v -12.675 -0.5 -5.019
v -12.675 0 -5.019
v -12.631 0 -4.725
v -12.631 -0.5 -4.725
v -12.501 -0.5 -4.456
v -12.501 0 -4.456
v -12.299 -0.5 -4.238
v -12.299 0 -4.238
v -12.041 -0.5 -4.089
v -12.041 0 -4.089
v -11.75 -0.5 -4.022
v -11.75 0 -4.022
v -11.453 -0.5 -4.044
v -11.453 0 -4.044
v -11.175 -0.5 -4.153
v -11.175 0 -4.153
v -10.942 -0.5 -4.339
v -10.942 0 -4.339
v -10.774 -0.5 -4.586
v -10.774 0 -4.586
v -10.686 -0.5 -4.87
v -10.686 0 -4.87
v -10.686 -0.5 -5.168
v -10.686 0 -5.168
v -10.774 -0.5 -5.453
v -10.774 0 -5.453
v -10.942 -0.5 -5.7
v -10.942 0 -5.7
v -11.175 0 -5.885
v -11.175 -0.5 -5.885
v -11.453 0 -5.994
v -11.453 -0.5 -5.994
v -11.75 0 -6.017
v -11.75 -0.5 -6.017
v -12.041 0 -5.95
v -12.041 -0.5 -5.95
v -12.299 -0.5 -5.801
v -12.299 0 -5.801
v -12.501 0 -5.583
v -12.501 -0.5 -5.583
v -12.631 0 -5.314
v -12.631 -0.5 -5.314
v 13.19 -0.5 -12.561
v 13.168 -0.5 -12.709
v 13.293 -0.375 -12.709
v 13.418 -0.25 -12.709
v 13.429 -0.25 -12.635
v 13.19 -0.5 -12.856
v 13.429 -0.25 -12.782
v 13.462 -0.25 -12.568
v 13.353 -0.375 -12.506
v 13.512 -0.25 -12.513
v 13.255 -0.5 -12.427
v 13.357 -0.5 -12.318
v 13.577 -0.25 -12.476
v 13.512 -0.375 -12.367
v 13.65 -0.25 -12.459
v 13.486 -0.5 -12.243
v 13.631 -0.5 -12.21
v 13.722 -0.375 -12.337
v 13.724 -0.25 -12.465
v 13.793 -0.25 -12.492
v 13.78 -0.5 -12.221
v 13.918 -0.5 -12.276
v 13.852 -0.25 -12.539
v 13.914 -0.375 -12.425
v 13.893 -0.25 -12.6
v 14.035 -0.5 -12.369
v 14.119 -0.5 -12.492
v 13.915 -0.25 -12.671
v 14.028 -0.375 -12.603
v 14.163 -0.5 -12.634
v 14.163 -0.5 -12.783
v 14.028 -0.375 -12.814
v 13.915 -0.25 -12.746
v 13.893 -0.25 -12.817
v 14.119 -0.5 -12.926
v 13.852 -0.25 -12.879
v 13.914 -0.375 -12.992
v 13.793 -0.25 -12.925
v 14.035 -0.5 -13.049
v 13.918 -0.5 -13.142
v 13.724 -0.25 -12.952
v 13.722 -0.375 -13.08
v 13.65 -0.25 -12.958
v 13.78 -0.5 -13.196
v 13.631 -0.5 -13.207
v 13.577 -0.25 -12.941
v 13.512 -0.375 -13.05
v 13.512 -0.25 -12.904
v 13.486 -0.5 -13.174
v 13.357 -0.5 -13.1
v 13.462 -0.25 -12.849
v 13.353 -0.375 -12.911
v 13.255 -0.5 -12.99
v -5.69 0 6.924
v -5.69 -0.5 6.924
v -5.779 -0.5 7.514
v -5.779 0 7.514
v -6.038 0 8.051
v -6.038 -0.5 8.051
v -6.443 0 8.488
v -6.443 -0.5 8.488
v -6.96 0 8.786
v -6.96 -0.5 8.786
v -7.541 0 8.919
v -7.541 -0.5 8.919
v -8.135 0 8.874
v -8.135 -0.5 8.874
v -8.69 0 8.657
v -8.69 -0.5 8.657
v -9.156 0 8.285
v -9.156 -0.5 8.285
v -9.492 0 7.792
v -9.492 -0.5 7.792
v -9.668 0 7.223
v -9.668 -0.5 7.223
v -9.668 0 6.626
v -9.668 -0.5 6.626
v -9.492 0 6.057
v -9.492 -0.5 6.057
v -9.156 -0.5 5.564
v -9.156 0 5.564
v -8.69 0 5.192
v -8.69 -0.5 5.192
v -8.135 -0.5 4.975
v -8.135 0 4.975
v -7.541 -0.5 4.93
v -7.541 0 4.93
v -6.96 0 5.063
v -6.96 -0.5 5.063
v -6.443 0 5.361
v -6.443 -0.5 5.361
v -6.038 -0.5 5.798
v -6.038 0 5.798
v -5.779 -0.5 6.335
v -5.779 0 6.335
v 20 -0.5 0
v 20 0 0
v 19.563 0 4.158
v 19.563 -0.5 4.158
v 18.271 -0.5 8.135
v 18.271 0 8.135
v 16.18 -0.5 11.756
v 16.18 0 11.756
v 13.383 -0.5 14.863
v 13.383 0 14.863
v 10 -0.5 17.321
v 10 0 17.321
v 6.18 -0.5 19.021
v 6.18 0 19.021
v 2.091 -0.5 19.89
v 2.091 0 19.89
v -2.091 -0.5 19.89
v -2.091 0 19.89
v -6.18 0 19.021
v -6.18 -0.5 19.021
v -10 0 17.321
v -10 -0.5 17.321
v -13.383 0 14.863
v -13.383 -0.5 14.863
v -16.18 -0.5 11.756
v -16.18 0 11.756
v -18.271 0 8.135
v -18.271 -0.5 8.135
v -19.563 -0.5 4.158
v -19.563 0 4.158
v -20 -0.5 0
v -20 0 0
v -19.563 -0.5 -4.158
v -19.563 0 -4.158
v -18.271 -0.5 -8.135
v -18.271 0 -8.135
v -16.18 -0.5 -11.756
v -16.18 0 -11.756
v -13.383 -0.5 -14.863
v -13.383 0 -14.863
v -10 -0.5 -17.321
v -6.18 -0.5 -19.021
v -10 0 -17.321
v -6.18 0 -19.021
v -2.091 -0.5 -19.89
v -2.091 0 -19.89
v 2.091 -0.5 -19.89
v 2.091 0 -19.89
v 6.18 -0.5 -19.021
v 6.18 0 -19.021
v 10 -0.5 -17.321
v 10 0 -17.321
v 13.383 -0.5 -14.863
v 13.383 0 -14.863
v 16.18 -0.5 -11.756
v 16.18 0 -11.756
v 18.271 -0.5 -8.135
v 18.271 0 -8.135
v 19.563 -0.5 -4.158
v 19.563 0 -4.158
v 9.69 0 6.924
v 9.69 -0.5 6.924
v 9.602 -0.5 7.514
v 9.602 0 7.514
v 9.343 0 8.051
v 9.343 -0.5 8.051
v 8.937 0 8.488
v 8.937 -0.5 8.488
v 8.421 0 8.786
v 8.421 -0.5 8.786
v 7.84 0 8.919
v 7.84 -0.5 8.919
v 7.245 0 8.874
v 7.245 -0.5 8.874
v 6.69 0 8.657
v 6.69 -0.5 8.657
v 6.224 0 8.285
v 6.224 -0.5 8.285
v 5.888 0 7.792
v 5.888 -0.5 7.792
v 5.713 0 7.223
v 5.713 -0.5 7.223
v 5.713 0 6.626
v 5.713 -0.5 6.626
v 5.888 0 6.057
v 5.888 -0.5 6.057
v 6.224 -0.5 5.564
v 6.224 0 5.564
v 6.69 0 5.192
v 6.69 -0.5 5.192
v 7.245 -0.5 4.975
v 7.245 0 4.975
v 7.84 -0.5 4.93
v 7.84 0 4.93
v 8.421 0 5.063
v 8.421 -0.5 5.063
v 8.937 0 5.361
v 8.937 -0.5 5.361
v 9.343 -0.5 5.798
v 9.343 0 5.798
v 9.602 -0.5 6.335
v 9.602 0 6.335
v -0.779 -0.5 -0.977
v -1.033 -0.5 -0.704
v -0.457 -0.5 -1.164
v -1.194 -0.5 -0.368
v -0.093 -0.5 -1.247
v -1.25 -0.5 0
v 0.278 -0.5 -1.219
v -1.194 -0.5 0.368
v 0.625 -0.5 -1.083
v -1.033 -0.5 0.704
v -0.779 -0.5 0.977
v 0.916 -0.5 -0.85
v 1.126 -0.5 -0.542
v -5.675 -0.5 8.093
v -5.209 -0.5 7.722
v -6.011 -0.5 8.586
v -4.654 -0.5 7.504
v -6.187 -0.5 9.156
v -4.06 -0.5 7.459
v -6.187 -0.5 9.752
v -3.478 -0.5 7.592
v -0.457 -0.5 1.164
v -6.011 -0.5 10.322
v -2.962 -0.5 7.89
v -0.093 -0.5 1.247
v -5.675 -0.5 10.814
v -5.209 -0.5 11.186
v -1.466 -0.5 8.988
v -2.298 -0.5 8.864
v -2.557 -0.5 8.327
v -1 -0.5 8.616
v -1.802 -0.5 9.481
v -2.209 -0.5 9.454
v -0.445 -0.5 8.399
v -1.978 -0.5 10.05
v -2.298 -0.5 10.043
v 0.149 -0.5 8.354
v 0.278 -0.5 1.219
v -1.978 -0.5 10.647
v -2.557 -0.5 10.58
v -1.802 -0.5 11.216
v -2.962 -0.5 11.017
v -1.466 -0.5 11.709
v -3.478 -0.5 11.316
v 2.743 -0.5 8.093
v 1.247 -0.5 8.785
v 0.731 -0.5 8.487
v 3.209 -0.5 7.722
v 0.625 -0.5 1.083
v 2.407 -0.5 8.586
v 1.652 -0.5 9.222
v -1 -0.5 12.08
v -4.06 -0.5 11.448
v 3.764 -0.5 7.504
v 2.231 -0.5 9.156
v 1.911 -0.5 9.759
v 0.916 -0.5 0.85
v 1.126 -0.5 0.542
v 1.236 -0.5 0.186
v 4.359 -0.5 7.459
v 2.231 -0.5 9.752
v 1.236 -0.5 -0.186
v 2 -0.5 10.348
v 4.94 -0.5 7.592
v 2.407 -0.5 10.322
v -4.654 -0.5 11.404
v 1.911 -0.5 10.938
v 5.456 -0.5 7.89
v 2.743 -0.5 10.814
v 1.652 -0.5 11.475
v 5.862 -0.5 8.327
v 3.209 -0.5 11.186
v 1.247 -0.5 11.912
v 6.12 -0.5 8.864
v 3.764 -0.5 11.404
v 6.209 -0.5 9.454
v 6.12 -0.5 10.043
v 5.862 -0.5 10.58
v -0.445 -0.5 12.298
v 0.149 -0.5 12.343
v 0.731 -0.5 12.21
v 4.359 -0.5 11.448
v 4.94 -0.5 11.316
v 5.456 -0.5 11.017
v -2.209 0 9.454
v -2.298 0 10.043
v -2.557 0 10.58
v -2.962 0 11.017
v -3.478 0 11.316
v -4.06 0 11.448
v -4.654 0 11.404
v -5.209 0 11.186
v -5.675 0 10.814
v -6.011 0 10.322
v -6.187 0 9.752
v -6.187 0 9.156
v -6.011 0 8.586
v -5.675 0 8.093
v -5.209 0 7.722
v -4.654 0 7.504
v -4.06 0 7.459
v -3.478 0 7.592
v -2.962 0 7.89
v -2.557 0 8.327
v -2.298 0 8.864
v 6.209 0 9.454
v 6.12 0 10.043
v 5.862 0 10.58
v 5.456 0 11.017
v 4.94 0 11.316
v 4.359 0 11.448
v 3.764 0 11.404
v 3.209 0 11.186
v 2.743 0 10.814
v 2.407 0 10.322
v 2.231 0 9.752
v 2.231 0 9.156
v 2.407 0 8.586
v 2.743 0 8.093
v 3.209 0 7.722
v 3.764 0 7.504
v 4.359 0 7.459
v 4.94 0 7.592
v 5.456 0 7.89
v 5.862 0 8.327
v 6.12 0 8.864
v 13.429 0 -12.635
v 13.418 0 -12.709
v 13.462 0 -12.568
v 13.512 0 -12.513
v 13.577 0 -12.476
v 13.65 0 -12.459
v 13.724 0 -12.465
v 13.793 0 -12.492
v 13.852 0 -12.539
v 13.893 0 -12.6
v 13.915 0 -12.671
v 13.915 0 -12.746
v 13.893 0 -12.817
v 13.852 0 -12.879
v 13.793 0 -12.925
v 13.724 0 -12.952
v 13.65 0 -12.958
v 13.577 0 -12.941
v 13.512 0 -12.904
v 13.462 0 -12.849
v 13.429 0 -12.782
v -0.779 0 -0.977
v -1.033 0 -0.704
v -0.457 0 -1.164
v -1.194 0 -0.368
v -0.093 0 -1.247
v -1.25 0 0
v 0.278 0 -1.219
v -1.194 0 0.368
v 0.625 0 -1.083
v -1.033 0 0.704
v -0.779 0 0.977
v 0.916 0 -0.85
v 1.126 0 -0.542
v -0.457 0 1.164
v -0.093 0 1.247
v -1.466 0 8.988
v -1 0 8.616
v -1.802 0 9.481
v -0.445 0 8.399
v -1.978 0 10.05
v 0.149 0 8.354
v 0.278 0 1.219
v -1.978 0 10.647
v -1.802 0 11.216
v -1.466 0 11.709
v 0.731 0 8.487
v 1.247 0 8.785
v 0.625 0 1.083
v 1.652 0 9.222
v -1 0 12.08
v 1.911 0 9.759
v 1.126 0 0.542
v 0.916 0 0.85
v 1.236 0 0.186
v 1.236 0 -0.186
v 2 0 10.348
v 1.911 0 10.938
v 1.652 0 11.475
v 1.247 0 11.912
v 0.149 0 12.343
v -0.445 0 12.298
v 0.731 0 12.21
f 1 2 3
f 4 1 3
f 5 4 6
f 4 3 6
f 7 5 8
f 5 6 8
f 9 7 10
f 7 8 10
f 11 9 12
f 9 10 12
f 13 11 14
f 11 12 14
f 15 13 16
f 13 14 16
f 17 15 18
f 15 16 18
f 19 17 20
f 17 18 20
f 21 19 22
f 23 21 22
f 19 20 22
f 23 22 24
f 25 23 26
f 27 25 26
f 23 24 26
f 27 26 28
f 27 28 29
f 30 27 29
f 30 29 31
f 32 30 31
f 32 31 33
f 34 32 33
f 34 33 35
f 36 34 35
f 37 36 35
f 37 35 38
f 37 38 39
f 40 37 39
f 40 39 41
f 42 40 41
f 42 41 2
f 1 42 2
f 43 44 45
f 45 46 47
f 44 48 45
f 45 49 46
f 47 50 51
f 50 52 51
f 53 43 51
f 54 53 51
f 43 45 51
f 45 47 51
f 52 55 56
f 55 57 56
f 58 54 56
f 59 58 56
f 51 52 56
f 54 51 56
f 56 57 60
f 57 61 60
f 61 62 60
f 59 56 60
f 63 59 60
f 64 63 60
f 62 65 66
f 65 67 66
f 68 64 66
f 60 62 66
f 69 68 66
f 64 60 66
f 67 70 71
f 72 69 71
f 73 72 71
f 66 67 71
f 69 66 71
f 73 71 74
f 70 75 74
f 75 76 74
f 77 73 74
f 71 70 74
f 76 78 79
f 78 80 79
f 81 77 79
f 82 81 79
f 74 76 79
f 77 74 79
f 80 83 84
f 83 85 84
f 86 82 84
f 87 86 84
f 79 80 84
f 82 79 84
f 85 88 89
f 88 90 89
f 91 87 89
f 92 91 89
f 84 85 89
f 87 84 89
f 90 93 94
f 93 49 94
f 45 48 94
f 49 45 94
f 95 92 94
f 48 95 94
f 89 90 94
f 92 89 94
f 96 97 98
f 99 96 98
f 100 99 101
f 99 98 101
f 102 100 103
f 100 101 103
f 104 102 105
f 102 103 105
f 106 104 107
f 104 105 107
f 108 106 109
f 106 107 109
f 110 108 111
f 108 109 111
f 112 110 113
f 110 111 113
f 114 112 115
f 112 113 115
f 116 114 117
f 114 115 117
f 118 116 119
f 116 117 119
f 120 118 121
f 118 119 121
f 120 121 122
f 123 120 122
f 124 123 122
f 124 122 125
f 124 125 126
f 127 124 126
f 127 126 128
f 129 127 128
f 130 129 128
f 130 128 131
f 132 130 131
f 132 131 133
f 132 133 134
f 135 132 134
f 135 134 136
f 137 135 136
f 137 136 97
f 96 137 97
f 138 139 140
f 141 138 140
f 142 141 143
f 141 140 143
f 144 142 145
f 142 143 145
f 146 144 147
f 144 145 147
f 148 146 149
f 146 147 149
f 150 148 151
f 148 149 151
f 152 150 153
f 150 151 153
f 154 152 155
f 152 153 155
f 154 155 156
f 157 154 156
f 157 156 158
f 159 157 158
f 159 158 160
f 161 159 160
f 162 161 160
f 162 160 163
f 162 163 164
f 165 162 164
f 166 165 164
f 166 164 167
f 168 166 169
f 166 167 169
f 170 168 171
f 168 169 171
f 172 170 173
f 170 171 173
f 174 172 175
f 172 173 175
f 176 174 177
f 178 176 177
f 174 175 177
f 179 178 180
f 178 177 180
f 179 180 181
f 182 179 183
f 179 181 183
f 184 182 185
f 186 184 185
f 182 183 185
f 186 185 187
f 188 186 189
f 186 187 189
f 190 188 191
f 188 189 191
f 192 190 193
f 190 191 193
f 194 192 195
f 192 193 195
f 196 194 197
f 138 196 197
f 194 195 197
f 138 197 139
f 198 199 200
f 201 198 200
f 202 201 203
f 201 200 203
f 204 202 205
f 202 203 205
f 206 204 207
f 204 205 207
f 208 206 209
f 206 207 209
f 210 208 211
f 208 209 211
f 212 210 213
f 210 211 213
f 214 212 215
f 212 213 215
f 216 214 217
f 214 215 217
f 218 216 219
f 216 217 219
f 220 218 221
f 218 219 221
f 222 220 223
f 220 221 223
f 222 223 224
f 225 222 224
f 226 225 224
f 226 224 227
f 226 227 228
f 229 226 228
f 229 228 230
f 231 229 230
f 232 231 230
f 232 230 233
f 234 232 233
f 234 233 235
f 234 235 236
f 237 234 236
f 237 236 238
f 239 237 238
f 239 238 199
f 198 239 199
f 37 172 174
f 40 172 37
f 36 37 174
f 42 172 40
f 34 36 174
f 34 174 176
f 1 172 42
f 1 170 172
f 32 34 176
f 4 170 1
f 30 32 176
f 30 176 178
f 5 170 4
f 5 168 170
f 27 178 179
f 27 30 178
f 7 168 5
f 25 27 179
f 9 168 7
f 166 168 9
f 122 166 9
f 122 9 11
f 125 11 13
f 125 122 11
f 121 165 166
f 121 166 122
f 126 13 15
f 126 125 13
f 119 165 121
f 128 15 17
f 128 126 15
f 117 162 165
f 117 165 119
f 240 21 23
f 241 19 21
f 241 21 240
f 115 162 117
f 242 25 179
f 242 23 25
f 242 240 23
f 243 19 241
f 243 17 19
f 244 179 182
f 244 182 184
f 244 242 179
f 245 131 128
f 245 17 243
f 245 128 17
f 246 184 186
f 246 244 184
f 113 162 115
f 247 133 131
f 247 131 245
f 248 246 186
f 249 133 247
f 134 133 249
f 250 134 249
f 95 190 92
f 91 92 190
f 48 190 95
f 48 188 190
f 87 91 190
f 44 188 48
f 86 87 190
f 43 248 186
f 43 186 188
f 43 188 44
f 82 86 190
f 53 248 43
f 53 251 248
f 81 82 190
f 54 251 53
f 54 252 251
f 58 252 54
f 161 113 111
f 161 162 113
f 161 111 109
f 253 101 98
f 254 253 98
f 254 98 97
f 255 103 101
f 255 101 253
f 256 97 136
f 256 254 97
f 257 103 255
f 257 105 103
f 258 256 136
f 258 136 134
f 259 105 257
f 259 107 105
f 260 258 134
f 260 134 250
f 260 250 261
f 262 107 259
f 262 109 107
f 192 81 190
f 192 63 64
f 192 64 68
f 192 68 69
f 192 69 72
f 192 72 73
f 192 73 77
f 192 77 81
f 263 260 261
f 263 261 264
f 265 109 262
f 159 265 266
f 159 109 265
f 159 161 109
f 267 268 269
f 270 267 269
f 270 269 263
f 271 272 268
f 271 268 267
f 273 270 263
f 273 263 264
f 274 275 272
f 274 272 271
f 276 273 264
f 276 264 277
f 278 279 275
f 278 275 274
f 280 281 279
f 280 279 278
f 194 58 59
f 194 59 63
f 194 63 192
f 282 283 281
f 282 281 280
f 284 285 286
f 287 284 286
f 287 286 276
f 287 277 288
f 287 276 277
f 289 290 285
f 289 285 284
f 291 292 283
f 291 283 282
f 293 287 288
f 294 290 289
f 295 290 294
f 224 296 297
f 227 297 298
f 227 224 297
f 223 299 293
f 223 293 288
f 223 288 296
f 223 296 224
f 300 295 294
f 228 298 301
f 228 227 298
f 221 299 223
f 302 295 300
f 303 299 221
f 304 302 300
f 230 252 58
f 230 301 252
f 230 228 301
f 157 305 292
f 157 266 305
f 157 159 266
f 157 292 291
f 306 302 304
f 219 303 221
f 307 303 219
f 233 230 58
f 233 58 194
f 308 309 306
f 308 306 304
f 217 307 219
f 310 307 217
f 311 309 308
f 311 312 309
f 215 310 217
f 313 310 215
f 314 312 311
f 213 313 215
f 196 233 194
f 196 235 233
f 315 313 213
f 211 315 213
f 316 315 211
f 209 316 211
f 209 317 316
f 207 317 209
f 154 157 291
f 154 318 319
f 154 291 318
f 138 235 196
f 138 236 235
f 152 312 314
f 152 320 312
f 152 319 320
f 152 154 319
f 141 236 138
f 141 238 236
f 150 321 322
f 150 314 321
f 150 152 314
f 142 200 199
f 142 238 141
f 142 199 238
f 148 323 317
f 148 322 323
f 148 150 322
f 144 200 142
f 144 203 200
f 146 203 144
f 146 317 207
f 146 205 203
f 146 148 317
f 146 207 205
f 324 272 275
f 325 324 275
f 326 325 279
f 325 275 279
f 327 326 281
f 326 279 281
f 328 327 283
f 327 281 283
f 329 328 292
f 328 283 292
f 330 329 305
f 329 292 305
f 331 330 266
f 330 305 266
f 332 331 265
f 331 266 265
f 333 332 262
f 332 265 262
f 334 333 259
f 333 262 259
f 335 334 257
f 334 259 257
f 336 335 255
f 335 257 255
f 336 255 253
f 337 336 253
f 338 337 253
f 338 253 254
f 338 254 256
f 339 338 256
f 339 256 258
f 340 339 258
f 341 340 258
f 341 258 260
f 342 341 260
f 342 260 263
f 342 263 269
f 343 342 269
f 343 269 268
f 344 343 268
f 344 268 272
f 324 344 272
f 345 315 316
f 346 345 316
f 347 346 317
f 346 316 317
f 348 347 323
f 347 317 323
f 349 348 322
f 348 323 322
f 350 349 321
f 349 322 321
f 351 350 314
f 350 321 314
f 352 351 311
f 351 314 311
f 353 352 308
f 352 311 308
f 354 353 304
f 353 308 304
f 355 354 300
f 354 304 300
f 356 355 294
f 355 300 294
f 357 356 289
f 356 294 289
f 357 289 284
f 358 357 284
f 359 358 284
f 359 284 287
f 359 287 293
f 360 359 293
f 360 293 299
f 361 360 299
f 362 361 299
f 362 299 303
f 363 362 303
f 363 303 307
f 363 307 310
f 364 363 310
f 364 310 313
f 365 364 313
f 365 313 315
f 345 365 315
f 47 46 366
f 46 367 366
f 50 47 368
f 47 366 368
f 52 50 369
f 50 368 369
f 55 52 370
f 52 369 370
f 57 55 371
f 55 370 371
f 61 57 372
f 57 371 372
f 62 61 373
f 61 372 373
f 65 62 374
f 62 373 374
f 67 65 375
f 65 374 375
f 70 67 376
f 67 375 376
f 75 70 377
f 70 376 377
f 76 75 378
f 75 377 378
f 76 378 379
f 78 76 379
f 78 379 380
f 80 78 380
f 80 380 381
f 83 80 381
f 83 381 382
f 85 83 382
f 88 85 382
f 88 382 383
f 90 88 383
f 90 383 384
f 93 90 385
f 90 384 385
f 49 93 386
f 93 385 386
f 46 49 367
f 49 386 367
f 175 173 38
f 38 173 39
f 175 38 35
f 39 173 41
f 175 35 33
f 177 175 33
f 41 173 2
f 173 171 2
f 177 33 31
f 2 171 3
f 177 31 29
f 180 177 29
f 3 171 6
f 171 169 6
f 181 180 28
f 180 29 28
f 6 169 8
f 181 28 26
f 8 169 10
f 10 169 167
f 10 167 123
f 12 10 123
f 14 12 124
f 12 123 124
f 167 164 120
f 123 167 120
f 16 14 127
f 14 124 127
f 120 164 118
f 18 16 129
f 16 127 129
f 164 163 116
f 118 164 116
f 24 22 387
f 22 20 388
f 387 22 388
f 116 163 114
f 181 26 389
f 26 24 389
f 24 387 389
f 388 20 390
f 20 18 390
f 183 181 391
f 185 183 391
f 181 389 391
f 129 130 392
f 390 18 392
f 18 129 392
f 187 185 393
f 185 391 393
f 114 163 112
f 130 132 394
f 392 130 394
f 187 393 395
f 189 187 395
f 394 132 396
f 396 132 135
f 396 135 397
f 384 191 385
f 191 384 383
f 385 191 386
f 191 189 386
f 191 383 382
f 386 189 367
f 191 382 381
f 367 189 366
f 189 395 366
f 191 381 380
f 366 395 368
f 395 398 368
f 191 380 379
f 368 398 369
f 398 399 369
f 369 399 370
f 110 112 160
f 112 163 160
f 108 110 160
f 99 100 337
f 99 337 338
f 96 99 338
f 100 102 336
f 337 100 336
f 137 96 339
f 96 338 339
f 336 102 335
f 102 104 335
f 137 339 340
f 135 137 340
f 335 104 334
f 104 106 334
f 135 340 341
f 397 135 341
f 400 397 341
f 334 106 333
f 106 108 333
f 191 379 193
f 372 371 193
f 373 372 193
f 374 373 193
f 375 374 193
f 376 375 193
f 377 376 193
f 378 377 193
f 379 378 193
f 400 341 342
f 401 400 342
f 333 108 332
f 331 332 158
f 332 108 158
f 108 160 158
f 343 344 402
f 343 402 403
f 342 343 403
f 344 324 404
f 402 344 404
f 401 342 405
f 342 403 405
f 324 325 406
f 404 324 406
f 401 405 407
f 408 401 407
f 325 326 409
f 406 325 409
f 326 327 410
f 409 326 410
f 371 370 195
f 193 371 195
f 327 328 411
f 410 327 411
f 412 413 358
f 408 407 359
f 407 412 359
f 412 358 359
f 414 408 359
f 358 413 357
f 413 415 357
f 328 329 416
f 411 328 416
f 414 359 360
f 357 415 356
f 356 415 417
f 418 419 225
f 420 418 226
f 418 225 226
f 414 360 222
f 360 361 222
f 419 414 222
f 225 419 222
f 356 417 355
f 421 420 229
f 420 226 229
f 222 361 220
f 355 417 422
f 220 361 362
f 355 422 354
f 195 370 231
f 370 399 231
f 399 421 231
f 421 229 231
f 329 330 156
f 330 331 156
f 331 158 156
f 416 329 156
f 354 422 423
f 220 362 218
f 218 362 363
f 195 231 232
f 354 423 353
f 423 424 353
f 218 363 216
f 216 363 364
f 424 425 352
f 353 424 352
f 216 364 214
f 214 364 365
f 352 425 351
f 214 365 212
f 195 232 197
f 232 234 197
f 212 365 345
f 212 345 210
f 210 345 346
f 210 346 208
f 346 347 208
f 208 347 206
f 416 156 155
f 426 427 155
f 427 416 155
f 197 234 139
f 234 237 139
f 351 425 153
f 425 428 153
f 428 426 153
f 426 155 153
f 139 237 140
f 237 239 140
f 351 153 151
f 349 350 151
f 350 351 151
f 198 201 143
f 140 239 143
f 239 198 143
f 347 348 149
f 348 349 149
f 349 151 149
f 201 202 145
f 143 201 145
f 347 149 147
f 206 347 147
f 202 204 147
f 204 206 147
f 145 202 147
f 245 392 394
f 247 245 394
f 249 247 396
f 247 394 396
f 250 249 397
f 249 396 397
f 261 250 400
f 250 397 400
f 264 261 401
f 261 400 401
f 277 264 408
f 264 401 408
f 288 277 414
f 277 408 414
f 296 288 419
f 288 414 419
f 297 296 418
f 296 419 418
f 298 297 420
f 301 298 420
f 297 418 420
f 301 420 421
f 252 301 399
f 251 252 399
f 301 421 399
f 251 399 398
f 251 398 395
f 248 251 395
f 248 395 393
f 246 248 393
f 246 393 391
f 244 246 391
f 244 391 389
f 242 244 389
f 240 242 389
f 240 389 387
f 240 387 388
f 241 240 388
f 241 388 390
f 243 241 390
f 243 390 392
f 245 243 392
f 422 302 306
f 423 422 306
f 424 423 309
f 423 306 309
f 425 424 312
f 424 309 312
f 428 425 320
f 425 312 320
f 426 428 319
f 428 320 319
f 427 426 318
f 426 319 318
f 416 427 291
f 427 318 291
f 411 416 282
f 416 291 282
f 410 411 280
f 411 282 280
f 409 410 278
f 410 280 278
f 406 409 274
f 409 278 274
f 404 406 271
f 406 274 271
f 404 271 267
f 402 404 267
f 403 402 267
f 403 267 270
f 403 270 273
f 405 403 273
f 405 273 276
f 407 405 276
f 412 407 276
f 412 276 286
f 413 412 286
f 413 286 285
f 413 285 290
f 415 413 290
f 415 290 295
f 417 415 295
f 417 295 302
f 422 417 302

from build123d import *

# Parameters (mm, degrees)
F0_R           = 20
F1_DEPTH       = 0.5
F3_D           = 2.5
F4_R           = 2
F5_DEPTH       = 25.4
F7_D           = 0.5
F7_CSINK_D     = 1
F7_CSINK_ANGLE = 90
F9_D           = 2


with BuildPart() as f1:
    # F0 (on Front) → F1 (new body)
    with BuildSketch(Plane.XZ):
        Circle(F0_R)
    extrude(amount=F1_DEPTH)

    # F3 (through all)
    with Locations(Plane.XZ.offset(0.5)):
        with Locations((0, 0)):
            Hole(F3_D / 2)

    # F4 (on face) → F5 (cut)
    with BuildSketch(Plane.XZ.offset(0.5)):
        with Locations((-7.690389, 6.924457)):
            Circle(F4_R)
        with Locations((-4.209089, 9.453769)):
            Circle(F4_R)
        with Locations((0, 10.348439)):
            Circle(F4_R)
        with Locations((4.209089, 9.453769)):
            Circle(F4_R)
        with Locations((7.690389, 6.924457)):
            Circle(F4_R)
    extrude(amount=-F5_DEPTH, mode=Mode.SUBTRACT)

    # F7 (through all)
    with Locations(Plane.XZ.offset(0.5)):
        with Locations((13.66825, -12.708602)):
            CounterSinkHole(F7_D / 2, F7_CSINK_D / 2, counter_sink_angle=F7_CSINK_ANGLE)

    # F9 (through all)
    with Locations(Plane.XZ.offset(0.5)):
        with Locations((-11.675261, -5.019424)):
            Hole(F9_D / 2)


solid = f1.part
